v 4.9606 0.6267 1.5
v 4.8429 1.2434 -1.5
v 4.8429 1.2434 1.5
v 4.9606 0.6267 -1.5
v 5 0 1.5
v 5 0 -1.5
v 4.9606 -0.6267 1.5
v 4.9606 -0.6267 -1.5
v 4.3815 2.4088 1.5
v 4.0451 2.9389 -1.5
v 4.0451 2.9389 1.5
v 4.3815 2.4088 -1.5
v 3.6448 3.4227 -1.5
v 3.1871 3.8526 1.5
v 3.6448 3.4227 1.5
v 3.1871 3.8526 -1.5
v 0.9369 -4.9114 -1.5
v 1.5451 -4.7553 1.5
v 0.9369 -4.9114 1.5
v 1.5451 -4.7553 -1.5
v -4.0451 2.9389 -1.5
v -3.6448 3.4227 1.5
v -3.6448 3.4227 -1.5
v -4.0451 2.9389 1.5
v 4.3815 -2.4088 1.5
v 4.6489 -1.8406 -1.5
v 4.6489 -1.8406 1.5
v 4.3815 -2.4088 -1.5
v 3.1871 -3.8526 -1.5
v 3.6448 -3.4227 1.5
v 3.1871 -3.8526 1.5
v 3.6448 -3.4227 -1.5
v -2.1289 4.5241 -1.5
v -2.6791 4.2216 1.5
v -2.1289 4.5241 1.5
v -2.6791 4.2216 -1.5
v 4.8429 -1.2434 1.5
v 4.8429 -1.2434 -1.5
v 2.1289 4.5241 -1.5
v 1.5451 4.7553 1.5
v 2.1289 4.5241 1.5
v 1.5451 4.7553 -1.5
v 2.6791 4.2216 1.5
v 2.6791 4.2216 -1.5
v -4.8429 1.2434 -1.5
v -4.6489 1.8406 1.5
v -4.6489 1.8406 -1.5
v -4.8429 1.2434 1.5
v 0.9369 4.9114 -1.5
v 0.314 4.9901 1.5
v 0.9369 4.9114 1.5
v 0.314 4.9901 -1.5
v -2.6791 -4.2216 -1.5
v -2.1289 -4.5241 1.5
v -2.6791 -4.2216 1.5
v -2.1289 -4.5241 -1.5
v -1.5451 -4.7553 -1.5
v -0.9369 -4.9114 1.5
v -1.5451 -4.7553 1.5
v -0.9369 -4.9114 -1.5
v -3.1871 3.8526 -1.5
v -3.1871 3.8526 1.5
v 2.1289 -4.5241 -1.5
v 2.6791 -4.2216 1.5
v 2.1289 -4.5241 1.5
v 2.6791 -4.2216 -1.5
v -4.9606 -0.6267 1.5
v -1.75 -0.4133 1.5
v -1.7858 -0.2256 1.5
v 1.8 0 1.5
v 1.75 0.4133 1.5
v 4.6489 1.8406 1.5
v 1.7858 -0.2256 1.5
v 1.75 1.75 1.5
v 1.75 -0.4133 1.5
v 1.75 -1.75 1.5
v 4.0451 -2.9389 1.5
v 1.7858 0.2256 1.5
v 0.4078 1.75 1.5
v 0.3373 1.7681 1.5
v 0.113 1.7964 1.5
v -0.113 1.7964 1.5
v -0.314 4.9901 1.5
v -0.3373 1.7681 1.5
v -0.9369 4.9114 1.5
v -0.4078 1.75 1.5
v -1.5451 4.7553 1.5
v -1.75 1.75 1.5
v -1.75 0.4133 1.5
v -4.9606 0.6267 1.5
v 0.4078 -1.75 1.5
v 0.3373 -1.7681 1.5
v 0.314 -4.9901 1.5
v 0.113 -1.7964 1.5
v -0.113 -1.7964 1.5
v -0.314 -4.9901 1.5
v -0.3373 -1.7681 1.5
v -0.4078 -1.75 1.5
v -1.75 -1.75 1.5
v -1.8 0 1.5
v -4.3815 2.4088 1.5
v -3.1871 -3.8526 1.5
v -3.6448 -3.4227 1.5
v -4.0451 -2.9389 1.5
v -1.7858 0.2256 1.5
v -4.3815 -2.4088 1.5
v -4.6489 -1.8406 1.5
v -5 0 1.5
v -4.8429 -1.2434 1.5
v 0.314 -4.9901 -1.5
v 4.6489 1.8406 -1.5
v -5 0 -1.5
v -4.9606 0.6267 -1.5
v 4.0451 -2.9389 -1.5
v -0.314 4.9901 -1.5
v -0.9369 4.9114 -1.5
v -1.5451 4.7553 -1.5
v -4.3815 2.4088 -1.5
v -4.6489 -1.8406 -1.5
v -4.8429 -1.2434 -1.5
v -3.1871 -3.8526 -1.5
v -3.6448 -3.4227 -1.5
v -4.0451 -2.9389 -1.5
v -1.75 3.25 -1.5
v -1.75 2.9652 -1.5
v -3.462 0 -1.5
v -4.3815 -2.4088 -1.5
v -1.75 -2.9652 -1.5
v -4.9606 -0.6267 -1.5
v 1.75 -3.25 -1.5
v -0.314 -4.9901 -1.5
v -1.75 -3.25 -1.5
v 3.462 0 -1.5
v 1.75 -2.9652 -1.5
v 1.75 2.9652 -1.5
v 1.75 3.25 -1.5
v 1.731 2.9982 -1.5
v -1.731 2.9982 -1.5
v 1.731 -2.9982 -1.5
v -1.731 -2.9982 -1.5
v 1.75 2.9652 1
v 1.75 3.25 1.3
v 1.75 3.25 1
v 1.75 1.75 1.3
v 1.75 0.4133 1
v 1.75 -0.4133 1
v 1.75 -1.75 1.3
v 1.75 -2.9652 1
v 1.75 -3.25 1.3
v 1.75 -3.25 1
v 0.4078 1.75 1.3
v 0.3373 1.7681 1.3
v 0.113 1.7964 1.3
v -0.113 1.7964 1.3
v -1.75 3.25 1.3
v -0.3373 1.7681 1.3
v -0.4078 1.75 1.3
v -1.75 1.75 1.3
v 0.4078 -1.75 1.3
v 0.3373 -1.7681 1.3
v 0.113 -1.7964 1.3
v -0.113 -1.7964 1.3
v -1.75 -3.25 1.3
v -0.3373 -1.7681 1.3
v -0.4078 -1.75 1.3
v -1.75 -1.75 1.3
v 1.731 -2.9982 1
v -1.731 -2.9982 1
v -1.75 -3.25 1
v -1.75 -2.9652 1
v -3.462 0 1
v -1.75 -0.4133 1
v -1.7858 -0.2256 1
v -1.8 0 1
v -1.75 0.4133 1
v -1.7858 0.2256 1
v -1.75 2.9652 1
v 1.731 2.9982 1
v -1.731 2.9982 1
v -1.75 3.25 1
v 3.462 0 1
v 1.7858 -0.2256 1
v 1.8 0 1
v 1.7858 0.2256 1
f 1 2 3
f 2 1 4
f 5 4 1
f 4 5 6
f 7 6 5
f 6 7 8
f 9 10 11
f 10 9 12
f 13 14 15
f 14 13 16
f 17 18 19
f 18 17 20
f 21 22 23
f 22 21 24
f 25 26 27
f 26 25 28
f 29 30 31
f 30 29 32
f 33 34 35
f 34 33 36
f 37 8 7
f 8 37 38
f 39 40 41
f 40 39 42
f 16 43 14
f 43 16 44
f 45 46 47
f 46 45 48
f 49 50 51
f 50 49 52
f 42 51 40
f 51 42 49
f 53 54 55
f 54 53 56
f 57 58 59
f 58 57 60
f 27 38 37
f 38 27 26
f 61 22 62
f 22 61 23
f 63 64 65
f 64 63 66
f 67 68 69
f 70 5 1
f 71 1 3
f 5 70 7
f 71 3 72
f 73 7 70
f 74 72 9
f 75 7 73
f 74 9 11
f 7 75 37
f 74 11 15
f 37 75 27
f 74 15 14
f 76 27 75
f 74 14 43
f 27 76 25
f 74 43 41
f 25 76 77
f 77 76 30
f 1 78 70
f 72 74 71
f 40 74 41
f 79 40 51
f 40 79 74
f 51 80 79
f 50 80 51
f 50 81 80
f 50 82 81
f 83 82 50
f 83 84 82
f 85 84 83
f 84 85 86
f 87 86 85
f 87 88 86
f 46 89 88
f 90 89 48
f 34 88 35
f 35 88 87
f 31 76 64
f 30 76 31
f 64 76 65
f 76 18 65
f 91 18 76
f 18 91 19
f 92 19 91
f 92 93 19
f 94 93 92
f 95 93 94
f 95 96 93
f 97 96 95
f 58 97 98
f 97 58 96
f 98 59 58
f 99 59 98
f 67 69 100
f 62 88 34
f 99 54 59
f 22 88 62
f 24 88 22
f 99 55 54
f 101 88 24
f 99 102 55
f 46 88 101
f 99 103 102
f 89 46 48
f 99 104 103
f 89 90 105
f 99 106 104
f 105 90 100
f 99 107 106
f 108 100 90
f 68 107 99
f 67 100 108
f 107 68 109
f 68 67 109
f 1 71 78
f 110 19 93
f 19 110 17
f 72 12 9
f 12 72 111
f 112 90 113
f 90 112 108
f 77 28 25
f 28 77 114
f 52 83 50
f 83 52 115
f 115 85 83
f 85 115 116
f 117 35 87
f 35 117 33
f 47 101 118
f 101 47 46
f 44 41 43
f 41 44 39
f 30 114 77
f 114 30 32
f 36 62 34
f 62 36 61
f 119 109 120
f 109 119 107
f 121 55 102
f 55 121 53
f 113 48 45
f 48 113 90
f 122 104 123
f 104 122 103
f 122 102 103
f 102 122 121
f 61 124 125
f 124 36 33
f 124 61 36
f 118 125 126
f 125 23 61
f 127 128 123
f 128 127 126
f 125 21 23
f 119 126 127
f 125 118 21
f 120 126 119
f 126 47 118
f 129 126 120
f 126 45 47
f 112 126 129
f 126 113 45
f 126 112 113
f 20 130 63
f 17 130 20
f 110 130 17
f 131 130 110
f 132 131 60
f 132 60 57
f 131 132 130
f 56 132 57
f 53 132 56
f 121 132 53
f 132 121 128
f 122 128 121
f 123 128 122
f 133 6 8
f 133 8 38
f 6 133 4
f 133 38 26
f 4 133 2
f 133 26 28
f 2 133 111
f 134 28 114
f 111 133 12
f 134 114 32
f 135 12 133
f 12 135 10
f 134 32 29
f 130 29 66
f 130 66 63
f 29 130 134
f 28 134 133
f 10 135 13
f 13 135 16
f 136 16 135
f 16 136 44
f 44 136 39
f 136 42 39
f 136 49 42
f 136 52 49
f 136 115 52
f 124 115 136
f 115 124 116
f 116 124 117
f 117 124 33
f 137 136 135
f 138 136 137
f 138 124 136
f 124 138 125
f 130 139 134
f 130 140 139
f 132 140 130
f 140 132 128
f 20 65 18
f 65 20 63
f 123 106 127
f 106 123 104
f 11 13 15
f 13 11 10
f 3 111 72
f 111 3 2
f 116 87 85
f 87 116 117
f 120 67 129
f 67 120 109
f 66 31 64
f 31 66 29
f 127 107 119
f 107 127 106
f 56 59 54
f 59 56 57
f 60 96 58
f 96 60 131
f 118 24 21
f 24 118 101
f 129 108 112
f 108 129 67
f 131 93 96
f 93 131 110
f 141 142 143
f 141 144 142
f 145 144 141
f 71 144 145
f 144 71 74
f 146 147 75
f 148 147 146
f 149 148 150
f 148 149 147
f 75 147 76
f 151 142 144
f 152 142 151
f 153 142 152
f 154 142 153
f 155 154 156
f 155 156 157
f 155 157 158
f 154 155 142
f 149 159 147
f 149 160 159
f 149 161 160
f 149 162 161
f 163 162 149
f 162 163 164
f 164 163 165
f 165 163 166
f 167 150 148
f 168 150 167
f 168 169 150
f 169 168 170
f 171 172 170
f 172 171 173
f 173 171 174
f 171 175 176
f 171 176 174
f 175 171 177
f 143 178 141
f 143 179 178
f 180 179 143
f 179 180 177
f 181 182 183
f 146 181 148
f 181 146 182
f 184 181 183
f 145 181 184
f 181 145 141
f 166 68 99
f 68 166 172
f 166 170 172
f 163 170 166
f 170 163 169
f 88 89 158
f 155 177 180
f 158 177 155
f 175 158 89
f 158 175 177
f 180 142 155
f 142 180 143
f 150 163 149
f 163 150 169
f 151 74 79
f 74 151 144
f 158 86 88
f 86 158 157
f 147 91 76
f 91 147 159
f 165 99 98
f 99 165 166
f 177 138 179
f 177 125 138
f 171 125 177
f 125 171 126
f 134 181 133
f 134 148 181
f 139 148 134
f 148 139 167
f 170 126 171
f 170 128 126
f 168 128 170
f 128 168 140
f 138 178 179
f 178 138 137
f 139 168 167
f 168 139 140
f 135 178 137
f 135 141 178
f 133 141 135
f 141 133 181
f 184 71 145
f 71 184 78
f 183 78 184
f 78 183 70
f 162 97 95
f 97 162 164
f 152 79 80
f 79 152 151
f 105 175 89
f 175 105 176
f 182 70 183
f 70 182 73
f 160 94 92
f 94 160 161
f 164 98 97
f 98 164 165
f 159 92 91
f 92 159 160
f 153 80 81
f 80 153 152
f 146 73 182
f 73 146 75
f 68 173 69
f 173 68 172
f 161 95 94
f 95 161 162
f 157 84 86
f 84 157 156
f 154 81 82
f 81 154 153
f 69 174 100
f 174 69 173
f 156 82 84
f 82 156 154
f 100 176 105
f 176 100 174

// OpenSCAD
$fn = 50;


difference() {
	union() {
		translate(v = [0, 0, -1.5000000000]) {
			cylinder(h = 3, r = 5.0000000000);
		}
		translate(v = [0, 0, -1.5000000000]) {
			cylinder(h = 3, r = 2.8500000000);
		}
	}
	union() {
		translate(v = [0, 0, -1.5000000000]) {
			rotate(a = [0, 0, 0]) {
				difference() {
					union() {
						translate(v = [-1.7500000000, -3.2500000000, -0.3000000000]) {
							cube(size = [3.5000000000, 6.5000000000, 0.3000000000]);
						}
						translate(v = [-1.7500000000, -1.7500000000, -0.6000000000]) {
							cube(size = [3.5000000000, 3.5000000000, 0.3000000000]);
						}
						translate(v = [-1.7500000000, -3.2500000000, 2.5000000000]) {
							cube(size = [3.5000000000, 6.5000000000, 0.3000000000]);
						}
						translate(v = [-1.7500000000, -1.7500000000, 2.8000000000]) {
							cube(size = [3.5000000000, 3.5000000000, 0.3000000000]);
						}
						linear_extrude(height = 2.5000000000) {
							polygon(points = [[3.4620000000, 0.0000000000], [1.7310000000, 2.9981799479], [-1.7310000000, 2.9981799479], [-3.4620000000, 0.0000000000], [-1.7310000000, -2.9981799479], [1.7310000000, -2.9981799479]]);
						}
						translate(v = [-1.7500000000, -3.2500000000, -0.3000000000]) {
							cube(size = [3.5000000000, 6.5000000000, 0.3000000000]);
						}
						translate(v = [-1.7500000000, -1.7500000000, -0.6000000000]) {
							cube(size = [3.5000000000, 3.5000000000, 0.3000000000]);
						}
						translate(v = [-1.7500000000, -3.2500000000, 2.5000000000]) {
							cube(size = [3.5000000000, 6.5000000000, 0.3000000000]);
						}
						translate(v = [-1.7500000000, -1.7500000000, 2.8000000000]) {
							cube(size = [3.5000000000, 3.5000000000, 0.3000000000]);
						}
						translate(v = [-1.7500000000, -3.2500000000, -0.3000000000]) {
							cube(size = [3.5000000000, 6.5000000000, 0.3000000000]);
						}
						translate(v = [-1.7500000000, -1.7500000000, -0.6000000000]) {
							cube(size = [3.5000000000, 3.5000000000, 0.3000000000]);
						}
						translate(v = [-1.7500000000, -3.2500000000, 2.5000000000]) {
							cube(size = [3.5000000000, 6.5000000000, 0.3000000000]);
						}
						translate(v = [-1.7500000000, -1.7500000000, 2.8000000000]) {
							cube(size = [3.5000000000, 3.5000000000, 0.3000000000]);
						}
					}
					union();
				}
			}
		}
		translate(v = [0, 0, -100.0000000000]) {
			cylinder(h = 200, r = 1.8000000000);
		}
	}
}
